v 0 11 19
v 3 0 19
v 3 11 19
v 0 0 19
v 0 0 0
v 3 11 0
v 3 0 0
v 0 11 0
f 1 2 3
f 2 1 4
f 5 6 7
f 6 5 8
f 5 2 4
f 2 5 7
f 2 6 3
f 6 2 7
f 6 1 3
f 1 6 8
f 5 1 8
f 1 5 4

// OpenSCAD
// Generated by SolidPython 1.0.1 on 2020-07-29 00:46:54


cube(size = [3, 11, 19]);
/***********************************************
*********      SolidPython code:      **********
************************************************
 
# import packages: SolidPython
from solid import *
from solid.utils import *
from itertools import chain, combinations, permutations


class Resize:

    def __init__(self, scad_file):
        self.scad_file = scad_file
        #self.scad_file = import_scad(scad_file)
        # cone/cylinder param:
        self.r1 = 0
        self.r2 = 0
        self.h = 0
        # rectangular prism param:
        self.w = 0
        self.l = 0
        # ellipse param:
        self.r = 0

    # import OpenScad code (file name corresponds to shape)


    # classify shape + parameters
    def assign(self, param1, param2, param3):
        if self.scad_file == 'cone.scad':
            self.r1 = param1
            self.r2 = param2
            self.h = param3
        elif self.scad_file == 'cylinder.scad':
            self.r1 = param1
            self.r2 = param2
            self.h = param3
        elif self.scad_file == 'rectangularPrism.scad':
            self.h = param1
            self.l = param2
            self.w = param3
        else:
            self.r = param1
            self.h = param2

    # resize parameters
    def iterate(self):
        x = range(3, 20, 2)
        i = 1
        if self.scad_file == 'cone.scad':
            tempList = list(permutations(x, 2))
            for temp in tempList:
                param1 = temp[0]
                param2 = temp[1]
                filepath = 'produced_scad_files/' + 'cone' + str(param1) + '_' + str(param2) + '_' + '.scad'
                scad_render_to_file(cylinder(h=param1, r1=param2, r2=0), filepath)

        elif self.scad_file == 'cylinder.scad':
            tempList = list(permutations(x, 3))
            for temp in tempList:
                param1 = temp[0]
                param2 = temp[1]
                filepath = 'produced_scad_files/' + 'cylinder' + str(param1) + '_' + str(param2) + '_' + '.scad'
                scad_render_to_file(cylinder(h=param1, r1=param2, r2=param2), filepath)

        elif self.scad_file == 'rectangularPrism.scad':
            tempList = list(permutations(x, 3))
            for temp in tempList:
                param1 = temp[0]
                param2 = temp[1]
                param3 = temp[2]
                filepath = 'produced_scad_files/' + 'rectangularPrism' + str(param1) + '_' + str(param2) + '_' + str(
                    param3) + '.scad'
                scad_render_to_file(cube(size=(param1, param2, param3)), filepath)

        elif self.scad_file == 'ellipse.scad':
            tempList = list(permutations(x, 4))
            for temp in tempList:
                param1 = temp[0]
                param2 = temp[1]
                param3 = temp[2]
                param4 = temp[3]
                filepath = 'produced_scad_files/' + 'ellipse' + str(param1) + '_' + str(param2) + '_' + str(param3) + '_' + str(param4) + '.scad'
                scad_render_to_file(scale([param1, param2, param3])(sphere(r=param4)), filepath)

    def render_to_scadfile(self):
        scad_render_to_file(scad, 'example.scad') 
 
************************************************/
